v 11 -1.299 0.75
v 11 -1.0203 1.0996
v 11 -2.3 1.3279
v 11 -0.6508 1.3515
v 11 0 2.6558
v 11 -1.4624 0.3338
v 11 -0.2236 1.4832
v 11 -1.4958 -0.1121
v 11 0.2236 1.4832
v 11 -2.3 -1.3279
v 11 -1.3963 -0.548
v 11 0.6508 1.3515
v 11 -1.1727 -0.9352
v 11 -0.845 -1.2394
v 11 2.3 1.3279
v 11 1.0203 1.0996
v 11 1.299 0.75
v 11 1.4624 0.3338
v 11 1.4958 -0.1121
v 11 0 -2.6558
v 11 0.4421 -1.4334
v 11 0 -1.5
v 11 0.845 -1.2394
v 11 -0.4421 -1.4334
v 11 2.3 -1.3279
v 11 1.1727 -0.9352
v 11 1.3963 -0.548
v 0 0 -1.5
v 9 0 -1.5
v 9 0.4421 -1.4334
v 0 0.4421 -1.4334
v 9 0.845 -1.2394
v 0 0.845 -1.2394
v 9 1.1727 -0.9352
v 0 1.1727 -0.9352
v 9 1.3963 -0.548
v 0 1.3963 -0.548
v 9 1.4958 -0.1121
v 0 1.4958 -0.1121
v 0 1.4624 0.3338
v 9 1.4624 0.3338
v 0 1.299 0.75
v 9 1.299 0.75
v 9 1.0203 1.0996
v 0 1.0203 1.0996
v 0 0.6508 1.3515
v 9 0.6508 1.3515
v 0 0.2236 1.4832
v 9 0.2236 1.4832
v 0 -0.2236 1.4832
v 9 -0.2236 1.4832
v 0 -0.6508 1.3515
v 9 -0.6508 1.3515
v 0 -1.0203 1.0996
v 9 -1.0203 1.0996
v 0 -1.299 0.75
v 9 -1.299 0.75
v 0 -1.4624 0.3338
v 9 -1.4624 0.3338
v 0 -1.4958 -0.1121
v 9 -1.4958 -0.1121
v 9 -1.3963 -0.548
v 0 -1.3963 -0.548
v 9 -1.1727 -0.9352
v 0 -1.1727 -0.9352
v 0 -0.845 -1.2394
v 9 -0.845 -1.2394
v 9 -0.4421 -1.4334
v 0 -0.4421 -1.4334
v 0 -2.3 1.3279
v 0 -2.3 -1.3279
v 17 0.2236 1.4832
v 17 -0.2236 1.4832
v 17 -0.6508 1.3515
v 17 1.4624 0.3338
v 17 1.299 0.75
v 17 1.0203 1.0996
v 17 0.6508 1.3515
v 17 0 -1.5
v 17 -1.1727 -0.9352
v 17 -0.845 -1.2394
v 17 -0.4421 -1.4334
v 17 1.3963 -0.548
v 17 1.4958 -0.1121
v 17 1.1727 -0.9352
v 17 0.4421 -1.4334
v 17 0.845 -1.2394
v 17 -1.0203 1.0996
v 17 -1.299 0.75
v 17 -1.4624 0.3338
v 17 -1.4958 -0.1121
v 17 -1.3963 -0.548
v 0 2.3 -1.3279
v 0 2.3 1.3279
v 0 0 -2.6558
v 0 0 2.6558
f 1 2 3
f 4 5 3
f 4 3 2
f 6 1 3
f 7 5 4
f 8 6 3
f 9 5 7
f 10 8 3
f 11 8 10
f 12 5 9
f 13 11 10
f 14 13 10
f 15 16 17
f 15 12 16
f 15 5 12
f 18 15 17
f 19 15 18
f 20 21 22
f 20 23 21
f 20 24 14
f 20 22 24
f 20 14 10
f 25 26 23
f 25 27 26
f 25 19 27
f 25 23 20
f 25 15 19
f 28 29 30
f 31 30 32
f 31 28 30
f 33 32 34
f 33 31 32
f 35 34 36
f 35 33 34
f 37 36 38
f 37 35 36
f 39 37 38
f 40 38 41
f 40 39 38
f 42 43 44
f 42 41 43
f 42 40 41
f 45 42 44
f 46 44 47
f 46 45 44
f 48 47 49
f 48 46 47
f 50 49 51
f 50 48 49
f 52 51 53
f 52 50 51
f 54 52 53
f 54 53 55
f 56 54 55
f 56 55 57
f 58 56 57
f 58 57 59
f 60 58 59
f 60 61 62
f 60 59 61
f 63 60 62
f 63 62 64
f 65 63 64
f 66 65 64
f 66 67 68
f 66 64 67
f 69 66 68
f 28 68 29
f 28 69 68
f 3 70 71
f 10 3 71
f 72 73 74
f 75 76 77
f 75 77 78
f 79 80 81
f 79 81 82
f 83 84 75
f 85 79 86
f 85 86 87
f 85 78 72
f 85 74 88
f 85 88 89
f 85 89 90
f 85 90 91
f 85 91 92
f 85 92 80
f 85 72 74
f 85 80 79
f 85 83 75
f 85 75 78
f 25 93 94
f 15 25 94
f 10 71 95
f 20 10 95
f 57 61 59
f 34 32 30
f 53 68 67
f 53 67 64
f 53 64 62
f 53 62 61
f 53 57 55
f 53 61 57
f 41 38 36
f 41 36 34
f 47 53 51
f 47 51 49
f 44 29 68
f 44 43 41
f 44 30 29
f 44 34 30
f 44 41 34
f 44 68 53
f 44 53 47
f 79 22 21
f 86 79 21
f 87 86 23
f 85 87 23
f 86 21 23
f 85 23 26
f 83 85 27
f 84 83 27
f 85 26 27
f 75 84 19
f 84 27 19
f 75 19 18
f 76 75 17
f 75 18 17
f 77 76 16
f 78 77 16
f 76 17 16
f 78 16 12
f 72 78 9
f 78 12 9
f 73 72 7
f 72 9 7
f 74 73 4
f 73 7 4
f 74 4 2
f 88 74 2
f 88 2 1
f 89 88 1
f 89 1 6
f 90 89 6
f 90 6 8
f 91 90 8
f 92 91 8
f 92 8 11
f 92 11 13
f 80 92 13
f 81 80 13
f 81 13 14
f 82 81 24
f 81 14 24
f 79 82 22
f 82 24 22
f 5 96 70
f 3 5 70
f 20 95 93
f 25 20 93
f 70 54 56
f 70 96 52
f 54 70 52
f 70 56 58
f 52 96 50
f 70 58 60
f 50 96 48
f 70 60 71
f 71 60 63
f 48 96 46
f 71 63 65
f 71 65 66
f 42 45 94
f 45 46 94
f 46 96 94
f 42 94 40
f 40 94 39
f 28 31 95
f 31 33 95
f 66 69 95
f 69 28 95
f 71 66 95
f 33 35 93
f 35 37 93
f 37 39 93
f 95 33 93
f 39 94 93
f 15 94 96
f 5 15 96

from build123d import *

# Parameters (mm, degrees)
SKETCH1_R           = 1.5
BOSS_EXTRUDE1_DEPTH = 11
SKETCH2_R           = 1.5
BOSS_EXTRUDE2_DEPTH = 6
BOSS_EXTRUDE3_DEPTH = 2


with BuildPart() as part:
    # Sketch1 → Boss-Extrude1 (new body)
    with BuildSketch(Plane(origin=(0, 0, 0), x_dir=(0, 0, -1), z_dir=(1, 0, 0))):
        Polygon((1.327905619, 2.3), (-1.327905619, 2.3), (-2.655811238, 0), (-1.327905619, -2.3), (1.327905619, -2.3), (2.655811238, 0), align=None)
        Circle(SKETCH1_R, mode=Mode.SUBTRACT)
    extrude(amount=BOSS_EXTRUDE1_DEPTH)



with BuildPart() as body_2:
    # Sketch2 → Boss-Extrude2 (new body)
    with BuildSketch(Plane(origin=(11, 0, 0), x_dir=(0, 0, -1), z_dir=(1, 0, 0))):
        Circle(SKETCH2_R)
    extrude(amount=BOSS_EXTRUDE2_DEPTH)


with BuildPart() as part_1:
    add(part.part)

    add(body_2.part)  # Boss-Extrude3 merges body 2
    # Sketch3 → Boss-Extrude3 (add)
    with BuildSketch(Plane.ZY.offset(-11)):
        Polygon((-1.327905619, 2.3), (-2.655811238, 0), (-1.327905619, -2.3), (1.327905619, -2.3), (2.655811238, 0), (1.327905619, 2.3), align=None)
    extrude(amount=BOSS_EXTRUDE3_DEPTH)


solid = part_1.part
